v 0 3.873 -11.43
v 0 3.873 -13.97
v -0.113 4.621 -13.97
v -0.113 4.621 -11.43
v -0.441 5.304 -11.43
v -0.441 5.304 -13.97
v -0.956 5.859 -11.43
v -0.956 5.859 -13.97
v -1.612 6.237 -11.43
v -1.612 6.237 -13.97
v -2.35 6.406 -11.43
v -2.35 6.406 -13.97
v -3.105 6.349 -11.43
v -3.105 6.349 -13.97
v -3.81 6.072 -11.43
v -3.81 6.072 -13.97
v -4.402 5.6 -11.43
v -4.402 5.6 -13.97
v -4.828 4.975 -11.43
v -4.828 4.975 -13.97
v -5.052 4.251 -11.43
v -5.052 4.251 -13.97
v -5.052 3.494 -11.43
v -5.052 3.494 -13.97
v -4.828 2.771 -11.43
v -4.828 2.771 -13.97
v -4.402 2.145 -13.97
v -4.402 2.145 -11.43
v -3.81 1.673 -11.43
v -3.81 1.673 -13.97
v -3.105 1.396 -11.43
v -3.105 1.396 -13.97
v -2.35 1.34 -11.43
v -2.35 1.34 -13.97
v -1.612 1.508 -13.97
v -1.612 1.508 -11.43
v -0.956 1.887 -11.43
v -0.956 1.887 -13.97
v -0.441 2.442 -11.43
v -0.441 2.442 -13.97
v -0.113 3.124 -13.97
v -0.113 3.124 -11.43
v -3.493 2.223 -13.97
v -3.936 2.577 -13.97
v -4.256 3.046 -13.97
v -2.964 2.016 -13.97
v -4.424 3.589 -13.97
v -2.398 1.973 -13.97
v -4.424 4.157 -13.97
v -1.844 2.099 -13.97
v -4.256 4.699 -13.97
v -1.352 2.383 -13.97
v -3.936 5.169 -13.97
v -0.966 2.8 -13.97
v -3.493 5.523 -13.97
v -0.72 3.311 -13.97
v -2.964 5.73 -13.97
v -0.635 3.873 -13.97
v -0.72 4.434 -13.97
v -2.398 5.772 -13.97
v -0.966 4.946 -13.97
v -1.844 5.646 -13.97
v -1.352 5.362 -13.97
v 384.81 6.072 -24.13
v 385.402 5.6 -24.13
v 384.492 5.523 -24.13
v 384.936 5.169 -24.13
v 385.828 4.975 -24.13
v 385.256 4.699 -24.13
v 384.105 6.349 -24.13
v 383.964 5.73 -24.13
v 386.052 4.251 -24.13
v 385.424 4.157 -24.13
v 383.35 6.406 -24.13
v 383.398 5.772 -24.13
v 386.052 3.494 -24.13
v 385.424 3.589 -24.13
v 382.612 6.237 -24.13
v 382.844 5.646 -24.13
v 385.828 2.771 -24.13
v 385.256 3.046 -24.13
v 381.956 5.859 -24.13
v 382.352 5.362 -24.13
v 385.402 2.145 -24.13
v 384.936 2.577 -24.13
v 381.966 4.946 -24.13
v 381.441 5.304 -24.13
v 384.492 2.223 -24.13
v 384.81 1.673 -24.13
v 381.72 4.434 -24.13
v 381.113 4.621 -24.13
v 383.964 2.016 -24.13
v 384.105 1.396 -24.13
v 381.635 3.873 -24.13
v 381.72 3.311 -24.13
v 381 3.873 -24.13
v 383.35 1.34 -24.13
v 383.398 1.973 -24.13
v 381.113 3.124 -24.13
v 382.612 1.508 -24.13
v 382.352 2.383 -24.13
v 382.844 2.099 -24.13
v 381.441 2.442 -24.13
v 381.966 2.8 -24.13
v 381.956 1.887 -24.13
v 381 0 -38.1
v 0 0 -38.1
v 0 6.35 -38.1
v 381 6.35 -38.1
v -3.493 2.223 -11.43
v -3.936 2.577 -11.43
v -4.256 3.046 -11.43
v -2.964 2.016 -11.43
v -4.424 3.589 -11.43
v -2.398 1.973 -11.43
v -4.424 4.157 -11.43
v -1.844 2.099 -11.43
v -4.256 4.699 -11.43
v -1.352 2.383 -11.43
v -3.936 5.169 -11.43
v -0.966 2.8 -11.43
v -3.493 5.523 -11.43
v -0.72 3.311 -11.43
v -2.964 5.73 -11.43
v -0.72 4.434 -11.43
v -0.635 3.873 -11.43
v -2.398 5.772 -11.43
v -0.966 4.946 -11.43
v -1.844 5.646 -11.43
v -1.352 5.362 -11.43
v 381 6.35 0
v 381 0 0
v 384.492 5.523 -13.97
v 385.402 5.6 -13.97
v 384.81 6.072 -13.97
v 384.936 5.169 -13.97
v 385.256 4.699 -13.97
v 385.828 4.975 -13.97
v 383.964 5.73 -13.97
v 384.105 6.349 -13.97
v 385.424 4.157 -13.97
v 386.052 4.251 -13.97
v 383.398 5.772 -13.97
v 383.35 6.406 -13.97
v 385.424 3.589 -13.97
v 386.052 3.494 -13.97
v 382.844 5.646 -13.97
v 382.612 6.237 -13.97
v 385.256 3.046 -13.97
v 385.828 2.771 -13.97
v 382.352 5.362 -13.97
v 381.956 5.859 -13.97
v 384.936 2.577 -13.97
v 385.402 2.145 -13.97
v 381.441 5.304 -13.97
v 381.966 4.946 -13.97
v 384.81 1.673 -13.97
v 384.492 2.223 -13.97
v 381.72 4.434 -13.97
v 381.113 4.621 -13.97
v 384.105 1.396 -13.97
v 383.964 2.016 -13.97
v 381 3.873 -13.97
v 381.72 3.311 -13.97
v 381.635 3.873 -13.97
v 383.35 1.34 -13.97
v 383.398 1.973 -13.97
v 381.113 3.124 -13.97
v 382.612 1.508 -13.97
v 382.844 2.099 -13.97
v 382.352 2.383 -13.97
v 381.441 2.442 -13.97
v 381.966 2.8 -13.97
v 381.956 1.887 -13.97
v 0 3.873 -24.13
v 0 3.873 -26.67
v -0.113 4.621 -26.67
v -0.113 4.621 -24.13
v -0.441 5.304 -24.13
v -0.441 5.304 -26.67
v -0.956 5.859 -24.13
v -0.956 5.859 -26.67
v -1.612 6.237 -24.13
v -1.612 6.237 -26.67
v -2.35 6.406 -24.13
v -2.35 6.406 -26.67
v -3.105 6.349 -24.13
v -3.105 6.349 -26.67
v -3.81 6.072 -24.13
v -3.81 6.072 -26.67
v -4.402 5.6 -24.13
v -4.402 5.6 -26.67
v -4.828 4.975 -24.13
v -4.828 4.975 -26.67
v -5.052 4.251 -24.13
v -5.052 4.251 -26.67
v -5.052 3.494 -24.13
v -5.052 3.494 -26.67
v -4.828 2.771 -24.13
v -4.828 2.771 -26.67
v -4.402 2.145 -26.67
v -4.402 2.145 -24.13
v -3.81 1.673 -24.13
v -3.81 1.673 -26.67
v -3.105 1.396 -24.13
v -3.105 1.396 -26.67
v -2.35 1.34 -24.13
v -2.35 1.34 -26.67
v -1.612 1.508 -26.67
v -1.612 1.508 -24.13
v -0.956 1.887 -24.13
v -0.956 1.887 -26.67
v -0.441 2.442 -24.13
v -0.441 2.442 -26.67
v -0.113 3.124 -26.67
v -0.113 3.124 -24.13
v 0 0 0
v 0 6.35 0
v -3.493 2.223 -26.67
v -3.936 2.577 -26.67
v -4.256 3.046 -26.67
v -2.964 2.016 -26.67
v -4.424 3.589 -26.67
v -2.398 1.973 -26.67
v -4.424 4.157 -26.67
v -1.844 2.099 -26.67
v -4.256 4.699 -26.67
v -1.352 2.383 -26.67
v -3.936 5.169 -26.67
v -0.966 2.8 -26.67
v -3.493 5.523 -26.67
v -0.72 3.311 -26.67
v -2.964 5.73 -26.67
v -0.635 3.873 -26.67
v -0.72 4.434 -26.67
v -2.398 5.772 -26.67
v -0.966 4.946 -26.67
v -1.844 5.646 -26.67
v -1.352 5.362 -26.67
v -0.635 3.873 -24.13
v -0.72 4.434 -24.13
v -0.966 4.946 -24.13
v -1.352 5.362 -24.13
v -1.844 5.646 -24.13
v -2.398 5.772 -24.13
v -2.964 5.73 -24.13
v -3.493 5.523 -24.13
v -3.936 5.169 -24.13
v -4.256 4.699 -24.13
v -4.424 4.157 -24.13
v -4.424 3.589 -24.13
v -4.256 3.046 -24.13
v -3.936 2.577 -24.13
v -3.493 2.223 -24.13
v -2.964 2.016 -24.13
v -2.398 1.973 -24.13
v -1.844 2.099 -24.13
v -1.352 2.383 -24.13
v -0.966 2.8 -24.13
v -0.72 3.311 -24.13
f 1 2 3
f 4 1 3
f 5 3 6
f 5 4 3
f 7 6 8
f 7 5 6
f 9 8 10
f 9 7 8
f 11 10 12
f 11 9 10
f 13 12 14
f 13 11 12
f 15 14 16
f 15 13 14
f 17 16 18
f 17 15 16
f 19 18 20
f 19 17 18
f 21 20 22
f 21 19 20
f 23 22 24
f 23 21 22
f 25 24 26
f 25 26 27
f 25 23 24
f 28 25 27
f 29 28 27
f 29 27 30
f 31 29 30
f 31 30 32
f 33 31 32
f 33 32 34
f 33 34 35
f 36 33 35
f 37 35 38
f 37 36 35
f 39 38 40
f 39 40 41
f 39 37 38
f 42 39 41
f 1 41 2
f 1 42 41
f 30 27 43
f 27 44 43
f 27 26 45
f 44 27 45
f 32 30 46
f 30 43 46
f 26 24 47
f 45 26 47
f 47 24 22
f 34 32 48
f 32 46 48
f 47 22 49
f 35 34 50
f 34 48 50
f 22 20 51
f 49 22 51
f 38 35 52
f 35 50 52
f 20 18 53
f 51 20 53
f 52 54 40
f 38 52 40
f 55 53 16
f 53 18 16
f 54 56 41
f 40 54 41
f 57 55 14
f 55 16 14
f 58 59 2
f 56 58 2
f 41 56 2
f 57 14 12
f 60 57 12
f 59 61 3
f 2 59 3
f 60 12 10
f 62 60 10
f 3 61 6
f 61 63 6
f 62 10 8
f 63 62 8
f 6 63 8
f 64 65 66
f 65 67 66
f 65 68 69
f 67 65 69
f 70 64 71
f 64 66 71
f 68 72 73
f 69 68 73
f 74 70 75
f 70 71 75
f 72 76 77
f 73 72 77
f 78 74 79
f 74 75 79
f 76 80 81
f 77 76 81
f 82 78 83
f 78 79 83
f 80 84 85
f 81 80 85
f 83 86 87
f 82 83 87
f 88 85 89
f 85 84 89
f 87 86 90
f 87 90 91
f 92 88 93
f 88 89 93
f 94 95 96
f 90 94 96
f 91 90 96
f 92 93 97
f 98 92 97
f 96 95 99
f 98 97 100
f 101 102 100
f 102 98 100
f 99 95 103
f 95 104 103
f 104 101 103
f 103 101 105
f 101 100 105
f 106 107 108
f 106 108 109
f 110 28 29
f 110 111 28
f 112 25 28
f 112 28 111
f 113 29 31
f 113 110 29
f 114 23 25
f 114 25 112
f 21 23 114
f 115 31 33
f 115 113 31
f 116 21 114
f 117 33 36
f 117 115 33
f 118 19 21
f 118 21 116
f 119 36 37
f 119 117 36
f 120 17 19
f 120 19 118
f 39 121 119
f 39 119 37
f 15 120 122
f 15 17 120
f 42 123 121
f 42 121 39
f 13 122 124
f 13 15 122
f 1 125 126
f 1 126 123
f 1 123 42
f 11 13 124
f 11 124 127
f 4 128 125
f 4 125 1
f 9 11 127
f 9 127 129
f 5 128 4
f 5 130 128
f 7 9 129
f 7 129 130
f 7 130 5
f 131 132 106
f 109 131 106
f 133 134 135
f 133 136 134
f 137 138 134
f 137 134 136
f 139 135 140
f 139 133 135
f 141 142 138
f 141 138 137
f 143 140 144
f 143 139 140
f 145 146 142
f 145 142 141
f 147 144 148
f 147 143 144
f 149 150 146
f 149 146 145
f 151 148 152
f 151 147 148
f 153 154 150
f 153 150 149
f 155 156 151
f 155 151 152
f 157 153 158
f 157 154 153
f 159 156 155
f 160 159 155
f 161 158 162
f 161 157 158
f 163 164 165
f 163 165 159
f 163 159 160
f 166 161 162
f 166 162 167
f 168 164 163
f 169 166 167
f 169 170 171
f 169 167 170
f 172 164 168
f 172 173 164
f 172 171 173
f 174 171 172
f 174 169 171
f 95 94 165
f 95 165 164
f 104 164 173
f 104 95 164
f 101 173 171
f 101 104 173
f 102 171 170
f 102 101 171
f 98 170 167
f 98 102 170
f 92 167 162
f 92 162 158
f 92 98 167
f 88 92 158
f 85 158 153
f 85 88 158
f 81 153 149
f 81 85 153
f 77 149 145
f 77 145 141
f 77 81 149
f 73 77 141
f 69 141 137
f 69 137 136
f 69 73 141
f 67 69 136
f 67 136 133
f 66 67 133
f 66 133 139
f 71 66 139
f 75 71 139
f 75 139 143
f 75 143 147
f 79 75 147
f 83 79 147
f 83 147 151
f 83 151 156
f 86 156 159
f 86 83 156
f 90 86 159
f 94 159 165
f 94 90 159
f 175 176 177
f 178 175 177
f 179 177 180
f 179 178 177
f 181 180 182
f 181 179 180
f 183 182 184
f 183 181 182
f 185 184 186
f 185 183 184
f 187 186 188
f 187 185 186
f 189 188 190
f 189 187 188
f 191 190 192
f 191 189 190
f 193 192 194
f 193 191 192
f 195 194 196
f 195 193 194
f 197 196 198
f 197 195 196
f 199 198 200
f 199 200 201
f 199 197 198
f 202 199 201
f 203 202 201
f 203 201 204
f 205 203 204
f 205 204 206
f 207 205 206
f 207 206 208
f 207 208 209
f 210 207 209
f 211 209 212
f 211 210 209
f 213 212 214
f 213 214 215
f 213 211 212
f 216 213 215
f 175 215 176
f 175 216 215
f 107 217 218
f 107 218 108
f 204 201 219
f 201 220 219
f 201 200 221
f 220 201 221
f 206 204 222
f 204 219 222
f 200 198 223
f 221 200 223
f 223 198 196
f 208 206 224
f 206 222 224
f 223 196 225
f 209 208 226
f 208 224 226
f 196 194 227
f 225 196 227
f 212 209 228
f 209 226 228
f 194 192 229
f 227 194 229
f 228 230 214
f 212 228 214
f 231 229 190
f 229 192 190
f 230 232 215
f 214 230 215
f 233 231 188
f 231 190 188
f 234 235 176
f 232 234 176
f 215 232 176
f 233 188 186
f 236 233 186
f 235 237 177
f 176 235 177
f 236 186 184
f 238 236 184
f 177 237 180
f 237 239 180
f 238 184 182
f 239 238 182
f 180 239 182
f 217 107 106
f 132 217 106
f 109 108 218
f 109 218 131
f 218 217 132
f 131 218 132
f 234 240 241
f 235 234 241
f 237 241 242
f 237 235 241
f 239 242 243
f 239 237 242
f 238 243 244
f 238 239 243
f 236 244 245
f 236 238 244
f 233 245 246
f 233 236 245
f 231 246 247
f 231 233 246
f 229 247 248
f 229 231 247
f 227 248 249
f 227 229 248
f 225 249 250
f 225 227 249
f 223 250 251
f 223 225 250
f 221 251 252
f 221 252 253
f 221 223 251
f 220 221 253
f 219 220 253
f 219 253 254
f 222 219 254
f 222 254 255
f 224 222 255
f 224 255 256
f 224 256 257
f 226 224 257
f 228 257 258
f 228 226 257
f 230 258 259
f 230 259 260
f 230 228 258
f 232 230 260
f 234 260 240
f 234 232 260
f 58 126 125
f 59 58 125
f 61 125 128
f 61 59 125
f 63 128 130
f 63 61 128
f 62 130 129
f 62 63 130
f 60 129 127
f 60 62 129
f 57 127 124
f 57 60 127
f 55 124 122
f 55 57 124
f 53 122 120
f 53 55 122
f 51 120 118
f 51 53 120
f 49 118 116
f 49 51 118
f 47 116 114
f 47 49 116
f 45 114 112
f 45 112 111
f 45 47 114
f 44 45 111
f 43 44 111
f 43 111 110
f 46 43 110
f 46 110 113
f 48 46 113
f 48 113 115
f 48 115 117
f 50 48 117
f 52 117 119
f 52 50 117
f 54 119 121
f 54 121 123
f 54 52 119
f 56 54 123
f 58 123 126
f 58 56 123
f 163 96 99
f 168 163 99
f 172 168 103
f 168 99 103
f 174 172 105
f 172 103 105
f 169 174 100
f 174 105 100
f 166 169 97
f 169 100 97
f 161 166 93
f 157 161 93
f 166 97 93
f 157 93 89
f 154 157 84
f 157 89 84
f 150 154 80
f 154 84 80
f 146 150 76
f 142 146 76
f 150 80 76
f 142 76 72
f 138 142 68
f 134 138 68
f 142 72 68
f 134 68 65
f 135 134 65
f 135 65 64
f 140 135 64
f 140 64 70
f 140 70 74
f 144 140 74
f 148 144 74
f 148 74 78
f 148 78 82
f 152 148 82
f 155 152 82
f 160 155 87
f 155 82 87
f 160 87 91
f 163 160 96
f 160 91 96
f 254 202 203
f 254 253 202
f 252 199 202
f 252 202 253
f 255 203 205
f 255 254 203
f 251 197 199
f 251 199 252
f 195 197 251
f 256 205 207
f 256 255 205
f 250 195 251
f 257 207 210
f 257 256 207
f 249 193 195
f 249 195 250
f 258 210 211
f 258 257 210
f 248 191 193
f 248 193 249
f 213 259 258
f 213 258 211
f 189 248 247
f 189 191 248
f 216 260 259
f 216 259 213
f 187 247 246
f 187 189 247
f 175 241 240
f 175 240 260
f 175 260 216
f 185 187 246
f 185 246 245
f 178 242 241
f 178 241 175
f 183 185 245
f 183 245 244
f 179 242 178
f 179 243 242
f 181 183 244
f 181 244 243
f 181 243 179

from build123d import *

# Parameters (mm, degrees)
SKETCH1_W                = 381
SKETCH1_H                = 38.1
BOSS_EXTRUDE1_DEPTH      = 6.35
SKETCH2_R                = 2.54
SKETCH2_R_2              = 1.905
BOSS_EXTRUDE2_DEPTH      = 1.27
LPATTERN1_COUNT          = 2
LPATTERN1_PITCH          = 12.7
BOSS_EXTRUDE4_DEPTH      = 5.08
BOSS_EXTRUDE4_DEPTH_BACK = 5.08
SKETCH4_R                = 2.54
SKETCH4_R_2              = 1.905


with BuildPart() as part:
    # Sketch1 → Boss-Extrude1 (new body)
    with BuildSketch(Plane(origin=(0, 0, 0), x_dir=(1, 0, 0), z_dir=(0, 1, 0))):
        with Locations((190.5, 19.05)):
            Rectangle(SKETCH1_W, SKETCH1_H)
    extrude(amount=BOSS_EXTRUDE1_DEPTH)


with BuildPart() as body_2:
    # Sketch2 → Boss-Extrude2 (new, symmetric)
    with BuildSketch(Plane.XY.offset(-12.7)):
        with Locations((-2.54, 3.872789775)):
            Circle(SKETCH2_R)
        with Locations((-2.54, 3.872789775)):
            Circle(SKETCH2_R_2, mode=Mode.SUBTRACT)
    boss_extrude2 = extrude(amount=BOSS_EXTRUDE2_DEPTH, both=True)


with BuildPart() as lpattern1_1:
    # LPattern1: Boss-Extrude2 ×2
    with Locations(*[(0, 0, -i * LPATTERN1_PITCH) for i in range(1, LPATTERN1_COUNT)]):
        add(boss_extrude2)


with BuildPart() as body_4:
    # Sketch4 → Boss-Extrude4 (new, two sides: drawn at the far end of the back side and taken through both)
    with BuildSketch(Plane.XY.offset(-19.05).offset(-BOSS_EXTRUDE4_DEPTH_BACK)):
        with Locations(Location((383.54, 3.872789775, 0), (0, 0, 180))):
            Circle(SKETCH4_R)
        with Locations(Location((383.54, 3.872789775, 0), (0, 0, 180))):
            Circle(SKETCH4_R_2, mode=Mode.SUBTRACT)
    extrude(amount=BOSS_EXTRUDE4_DEPTH + BOSS_EXTRUDE4_DEPTH_BACK)


solid = Compound([part.part, body_2.part, lpattern1_1.part, body_4.part])
